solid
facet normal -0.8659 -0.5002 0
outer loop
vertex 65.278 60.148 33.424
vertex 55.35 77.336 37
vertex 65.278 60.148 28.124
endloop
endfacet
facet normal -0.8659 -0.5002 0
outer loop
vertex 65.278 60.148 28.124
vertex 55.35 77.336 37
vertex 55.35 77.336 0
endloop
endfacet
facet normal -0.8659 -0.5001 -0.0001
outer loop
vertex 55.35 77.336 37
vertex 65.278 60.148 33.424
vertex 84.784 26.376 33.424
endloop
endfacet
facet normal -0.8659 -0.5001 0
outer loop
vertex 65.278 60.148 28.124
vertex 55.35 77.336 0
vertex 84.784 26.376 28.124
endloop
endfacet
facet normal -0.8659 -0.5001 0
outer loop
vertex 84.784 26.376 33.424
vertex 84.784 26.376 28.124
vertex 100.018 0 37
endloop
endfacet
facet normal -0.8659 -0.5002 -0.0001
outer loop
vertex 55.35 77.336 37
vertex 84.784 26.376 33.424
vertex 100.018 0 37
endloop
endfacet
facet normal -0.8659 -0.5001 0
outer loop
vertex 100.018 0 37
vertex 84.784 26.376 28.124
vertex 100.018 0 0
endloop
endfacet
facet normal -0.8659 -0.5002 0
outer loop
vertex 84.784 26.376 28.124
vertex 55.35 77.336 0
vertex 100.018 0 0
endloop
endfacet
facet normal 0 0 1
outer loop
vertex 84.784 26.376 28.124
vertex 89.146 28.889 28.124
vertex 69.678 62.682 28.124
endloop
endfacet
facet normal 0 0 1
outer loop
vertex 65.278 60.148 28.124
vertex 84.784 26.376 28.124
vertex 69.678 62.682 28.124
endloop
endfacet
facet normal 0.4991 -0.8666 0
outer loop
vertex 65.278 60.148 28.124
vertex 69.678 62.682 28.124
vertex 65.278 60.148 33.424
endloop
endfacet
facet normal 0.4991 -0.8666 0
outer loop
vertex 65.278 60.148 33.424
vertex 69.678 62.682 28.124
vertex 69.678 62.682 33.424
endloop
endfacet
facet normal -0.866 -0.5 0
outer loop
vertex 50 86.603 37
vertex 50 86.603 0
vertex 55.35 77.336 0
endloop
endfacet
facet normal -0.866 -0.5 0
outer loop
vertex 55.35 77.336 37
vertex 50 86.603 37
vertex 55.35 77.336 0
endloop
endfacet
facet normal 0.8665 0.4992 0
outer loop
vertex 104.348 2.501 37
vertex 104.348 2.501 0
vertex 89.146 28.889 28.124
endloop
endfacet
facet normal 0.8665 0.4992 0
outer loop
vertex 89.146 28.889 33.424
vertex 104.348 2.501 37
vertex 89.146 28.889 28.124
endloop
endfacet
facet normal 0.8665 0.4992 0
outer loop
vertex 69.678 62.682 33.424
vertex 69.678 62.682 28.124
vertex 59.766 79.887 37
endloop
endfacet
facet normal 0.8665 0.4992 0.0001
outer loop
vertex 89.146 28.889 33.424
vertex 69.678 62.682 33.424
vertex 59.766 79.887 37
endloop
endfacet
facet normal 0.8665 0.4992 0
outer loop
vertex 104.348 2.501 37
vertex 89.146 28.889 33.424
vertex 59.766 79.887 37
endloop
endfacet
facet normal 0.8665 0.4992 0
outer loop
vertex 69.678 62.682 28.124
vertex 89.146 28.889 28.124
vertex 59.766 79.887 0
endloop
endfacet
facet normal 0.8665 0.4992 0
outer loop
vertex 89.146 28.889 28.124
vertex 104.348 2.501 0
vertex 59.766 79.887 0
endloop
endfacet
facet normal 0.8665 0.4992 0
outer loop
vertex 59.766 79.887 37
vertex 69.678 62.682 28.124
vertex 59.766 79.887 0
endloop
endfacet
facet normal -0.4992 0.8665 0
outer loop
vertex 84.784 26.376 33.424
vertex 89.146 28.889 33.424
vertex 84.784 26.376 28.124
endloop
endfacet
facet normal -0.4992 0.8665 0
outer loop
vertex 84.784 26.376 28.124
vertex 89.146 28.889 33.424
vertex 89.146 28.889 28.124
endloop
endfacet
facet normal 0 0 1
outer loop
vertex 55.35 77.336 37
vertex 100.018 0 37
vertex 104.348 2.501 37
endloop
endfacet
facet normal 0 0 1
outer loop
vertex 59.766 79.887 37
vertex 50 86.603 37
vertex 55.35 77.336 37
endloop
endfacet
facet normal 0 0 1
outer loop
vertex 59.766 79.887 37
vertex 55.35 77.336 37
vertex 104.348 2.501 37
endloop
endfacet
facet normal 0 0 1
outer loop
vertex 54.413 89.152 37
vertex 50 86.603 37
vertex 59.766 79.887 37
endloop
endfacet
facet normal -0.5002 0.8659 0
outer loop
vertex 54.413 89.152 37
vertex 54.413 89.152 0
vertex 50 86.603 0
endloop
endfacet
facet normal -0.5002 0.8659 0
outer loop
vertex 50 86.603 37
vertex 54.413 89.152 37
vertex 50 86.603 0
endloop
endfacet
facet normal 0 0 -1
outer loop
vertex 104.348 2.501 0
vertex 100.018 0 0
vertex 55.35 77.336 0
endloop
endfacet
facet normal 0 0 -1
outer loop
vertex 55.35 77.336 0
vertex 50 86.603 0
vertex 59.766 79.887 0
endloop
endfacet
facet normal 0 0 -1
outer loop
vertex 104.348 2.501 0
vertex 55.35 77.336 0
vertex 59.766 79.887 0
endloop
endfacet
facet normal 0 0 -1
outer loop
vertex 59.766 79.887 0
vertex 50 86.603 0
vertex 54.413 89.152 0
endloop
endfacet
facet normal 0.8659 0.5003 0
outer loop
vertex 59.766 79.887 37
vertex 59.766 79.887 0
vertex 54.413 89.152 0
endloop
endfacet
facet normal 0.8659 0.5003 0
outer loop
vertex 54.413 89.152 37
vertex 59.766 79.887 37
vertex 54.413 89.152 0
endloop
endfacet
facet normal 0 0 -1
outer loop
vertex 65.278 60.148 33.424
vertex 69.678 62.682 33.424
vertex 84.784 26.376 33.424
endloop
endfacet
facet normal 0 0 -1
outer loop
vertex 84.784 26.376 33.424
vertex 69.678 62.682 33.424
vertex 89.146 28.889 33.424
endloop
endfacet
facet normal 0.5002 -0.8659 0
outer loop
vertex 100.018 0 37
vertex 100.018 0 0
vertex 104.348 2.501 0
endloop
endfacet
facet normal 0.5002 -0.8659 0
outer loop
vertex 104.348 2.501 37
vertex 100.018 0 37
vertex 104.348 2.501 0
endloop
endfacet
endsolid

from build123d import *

# Parameters (mm, degrees)
SALIENTE_EXTRUIR1_DEPTH = 37
CORTAR_EXTRUIR1_DEPTH   = 10


with BuildPart() as part:
    # Croquis1 → Saliente-Extruir1 (new body)
    with BuildSketch(Plane.XY):
        Polygon((55.350000047, 77.336068513), (100.017938292, 0), (104.347630379, 2.500753173), (59.766286021, 79.886836776), (54.412620908, 89.152214546), (50.000000028, 86.602540366), align=None)
    extrude(amount=SALIENTE_EXTRUIR1_DEPTH)

    # Croquis2 → Cortar-Extruir1 (cut)
    with BuildSketch(Plane(origin=(79.427815776, 45.757565725, 0), x_dir=(0, 0, -1), z_dir=(0.866497897, 0.499180723, 0))):
        Polygon((-33.424409531, 19.532383801), (-33.424409531, -19.467616199), (-28.124409531, -19.467616199), (-28.124409531, -0.028001757), (-28.124409531, 0.092769359), (-28.124409531, 19.532383801), align=None)
    extrude(amount=-CORTAR_EXTRUIR1_DEPTH, mode=Mode.SUBTRACT)


solid = part.part
